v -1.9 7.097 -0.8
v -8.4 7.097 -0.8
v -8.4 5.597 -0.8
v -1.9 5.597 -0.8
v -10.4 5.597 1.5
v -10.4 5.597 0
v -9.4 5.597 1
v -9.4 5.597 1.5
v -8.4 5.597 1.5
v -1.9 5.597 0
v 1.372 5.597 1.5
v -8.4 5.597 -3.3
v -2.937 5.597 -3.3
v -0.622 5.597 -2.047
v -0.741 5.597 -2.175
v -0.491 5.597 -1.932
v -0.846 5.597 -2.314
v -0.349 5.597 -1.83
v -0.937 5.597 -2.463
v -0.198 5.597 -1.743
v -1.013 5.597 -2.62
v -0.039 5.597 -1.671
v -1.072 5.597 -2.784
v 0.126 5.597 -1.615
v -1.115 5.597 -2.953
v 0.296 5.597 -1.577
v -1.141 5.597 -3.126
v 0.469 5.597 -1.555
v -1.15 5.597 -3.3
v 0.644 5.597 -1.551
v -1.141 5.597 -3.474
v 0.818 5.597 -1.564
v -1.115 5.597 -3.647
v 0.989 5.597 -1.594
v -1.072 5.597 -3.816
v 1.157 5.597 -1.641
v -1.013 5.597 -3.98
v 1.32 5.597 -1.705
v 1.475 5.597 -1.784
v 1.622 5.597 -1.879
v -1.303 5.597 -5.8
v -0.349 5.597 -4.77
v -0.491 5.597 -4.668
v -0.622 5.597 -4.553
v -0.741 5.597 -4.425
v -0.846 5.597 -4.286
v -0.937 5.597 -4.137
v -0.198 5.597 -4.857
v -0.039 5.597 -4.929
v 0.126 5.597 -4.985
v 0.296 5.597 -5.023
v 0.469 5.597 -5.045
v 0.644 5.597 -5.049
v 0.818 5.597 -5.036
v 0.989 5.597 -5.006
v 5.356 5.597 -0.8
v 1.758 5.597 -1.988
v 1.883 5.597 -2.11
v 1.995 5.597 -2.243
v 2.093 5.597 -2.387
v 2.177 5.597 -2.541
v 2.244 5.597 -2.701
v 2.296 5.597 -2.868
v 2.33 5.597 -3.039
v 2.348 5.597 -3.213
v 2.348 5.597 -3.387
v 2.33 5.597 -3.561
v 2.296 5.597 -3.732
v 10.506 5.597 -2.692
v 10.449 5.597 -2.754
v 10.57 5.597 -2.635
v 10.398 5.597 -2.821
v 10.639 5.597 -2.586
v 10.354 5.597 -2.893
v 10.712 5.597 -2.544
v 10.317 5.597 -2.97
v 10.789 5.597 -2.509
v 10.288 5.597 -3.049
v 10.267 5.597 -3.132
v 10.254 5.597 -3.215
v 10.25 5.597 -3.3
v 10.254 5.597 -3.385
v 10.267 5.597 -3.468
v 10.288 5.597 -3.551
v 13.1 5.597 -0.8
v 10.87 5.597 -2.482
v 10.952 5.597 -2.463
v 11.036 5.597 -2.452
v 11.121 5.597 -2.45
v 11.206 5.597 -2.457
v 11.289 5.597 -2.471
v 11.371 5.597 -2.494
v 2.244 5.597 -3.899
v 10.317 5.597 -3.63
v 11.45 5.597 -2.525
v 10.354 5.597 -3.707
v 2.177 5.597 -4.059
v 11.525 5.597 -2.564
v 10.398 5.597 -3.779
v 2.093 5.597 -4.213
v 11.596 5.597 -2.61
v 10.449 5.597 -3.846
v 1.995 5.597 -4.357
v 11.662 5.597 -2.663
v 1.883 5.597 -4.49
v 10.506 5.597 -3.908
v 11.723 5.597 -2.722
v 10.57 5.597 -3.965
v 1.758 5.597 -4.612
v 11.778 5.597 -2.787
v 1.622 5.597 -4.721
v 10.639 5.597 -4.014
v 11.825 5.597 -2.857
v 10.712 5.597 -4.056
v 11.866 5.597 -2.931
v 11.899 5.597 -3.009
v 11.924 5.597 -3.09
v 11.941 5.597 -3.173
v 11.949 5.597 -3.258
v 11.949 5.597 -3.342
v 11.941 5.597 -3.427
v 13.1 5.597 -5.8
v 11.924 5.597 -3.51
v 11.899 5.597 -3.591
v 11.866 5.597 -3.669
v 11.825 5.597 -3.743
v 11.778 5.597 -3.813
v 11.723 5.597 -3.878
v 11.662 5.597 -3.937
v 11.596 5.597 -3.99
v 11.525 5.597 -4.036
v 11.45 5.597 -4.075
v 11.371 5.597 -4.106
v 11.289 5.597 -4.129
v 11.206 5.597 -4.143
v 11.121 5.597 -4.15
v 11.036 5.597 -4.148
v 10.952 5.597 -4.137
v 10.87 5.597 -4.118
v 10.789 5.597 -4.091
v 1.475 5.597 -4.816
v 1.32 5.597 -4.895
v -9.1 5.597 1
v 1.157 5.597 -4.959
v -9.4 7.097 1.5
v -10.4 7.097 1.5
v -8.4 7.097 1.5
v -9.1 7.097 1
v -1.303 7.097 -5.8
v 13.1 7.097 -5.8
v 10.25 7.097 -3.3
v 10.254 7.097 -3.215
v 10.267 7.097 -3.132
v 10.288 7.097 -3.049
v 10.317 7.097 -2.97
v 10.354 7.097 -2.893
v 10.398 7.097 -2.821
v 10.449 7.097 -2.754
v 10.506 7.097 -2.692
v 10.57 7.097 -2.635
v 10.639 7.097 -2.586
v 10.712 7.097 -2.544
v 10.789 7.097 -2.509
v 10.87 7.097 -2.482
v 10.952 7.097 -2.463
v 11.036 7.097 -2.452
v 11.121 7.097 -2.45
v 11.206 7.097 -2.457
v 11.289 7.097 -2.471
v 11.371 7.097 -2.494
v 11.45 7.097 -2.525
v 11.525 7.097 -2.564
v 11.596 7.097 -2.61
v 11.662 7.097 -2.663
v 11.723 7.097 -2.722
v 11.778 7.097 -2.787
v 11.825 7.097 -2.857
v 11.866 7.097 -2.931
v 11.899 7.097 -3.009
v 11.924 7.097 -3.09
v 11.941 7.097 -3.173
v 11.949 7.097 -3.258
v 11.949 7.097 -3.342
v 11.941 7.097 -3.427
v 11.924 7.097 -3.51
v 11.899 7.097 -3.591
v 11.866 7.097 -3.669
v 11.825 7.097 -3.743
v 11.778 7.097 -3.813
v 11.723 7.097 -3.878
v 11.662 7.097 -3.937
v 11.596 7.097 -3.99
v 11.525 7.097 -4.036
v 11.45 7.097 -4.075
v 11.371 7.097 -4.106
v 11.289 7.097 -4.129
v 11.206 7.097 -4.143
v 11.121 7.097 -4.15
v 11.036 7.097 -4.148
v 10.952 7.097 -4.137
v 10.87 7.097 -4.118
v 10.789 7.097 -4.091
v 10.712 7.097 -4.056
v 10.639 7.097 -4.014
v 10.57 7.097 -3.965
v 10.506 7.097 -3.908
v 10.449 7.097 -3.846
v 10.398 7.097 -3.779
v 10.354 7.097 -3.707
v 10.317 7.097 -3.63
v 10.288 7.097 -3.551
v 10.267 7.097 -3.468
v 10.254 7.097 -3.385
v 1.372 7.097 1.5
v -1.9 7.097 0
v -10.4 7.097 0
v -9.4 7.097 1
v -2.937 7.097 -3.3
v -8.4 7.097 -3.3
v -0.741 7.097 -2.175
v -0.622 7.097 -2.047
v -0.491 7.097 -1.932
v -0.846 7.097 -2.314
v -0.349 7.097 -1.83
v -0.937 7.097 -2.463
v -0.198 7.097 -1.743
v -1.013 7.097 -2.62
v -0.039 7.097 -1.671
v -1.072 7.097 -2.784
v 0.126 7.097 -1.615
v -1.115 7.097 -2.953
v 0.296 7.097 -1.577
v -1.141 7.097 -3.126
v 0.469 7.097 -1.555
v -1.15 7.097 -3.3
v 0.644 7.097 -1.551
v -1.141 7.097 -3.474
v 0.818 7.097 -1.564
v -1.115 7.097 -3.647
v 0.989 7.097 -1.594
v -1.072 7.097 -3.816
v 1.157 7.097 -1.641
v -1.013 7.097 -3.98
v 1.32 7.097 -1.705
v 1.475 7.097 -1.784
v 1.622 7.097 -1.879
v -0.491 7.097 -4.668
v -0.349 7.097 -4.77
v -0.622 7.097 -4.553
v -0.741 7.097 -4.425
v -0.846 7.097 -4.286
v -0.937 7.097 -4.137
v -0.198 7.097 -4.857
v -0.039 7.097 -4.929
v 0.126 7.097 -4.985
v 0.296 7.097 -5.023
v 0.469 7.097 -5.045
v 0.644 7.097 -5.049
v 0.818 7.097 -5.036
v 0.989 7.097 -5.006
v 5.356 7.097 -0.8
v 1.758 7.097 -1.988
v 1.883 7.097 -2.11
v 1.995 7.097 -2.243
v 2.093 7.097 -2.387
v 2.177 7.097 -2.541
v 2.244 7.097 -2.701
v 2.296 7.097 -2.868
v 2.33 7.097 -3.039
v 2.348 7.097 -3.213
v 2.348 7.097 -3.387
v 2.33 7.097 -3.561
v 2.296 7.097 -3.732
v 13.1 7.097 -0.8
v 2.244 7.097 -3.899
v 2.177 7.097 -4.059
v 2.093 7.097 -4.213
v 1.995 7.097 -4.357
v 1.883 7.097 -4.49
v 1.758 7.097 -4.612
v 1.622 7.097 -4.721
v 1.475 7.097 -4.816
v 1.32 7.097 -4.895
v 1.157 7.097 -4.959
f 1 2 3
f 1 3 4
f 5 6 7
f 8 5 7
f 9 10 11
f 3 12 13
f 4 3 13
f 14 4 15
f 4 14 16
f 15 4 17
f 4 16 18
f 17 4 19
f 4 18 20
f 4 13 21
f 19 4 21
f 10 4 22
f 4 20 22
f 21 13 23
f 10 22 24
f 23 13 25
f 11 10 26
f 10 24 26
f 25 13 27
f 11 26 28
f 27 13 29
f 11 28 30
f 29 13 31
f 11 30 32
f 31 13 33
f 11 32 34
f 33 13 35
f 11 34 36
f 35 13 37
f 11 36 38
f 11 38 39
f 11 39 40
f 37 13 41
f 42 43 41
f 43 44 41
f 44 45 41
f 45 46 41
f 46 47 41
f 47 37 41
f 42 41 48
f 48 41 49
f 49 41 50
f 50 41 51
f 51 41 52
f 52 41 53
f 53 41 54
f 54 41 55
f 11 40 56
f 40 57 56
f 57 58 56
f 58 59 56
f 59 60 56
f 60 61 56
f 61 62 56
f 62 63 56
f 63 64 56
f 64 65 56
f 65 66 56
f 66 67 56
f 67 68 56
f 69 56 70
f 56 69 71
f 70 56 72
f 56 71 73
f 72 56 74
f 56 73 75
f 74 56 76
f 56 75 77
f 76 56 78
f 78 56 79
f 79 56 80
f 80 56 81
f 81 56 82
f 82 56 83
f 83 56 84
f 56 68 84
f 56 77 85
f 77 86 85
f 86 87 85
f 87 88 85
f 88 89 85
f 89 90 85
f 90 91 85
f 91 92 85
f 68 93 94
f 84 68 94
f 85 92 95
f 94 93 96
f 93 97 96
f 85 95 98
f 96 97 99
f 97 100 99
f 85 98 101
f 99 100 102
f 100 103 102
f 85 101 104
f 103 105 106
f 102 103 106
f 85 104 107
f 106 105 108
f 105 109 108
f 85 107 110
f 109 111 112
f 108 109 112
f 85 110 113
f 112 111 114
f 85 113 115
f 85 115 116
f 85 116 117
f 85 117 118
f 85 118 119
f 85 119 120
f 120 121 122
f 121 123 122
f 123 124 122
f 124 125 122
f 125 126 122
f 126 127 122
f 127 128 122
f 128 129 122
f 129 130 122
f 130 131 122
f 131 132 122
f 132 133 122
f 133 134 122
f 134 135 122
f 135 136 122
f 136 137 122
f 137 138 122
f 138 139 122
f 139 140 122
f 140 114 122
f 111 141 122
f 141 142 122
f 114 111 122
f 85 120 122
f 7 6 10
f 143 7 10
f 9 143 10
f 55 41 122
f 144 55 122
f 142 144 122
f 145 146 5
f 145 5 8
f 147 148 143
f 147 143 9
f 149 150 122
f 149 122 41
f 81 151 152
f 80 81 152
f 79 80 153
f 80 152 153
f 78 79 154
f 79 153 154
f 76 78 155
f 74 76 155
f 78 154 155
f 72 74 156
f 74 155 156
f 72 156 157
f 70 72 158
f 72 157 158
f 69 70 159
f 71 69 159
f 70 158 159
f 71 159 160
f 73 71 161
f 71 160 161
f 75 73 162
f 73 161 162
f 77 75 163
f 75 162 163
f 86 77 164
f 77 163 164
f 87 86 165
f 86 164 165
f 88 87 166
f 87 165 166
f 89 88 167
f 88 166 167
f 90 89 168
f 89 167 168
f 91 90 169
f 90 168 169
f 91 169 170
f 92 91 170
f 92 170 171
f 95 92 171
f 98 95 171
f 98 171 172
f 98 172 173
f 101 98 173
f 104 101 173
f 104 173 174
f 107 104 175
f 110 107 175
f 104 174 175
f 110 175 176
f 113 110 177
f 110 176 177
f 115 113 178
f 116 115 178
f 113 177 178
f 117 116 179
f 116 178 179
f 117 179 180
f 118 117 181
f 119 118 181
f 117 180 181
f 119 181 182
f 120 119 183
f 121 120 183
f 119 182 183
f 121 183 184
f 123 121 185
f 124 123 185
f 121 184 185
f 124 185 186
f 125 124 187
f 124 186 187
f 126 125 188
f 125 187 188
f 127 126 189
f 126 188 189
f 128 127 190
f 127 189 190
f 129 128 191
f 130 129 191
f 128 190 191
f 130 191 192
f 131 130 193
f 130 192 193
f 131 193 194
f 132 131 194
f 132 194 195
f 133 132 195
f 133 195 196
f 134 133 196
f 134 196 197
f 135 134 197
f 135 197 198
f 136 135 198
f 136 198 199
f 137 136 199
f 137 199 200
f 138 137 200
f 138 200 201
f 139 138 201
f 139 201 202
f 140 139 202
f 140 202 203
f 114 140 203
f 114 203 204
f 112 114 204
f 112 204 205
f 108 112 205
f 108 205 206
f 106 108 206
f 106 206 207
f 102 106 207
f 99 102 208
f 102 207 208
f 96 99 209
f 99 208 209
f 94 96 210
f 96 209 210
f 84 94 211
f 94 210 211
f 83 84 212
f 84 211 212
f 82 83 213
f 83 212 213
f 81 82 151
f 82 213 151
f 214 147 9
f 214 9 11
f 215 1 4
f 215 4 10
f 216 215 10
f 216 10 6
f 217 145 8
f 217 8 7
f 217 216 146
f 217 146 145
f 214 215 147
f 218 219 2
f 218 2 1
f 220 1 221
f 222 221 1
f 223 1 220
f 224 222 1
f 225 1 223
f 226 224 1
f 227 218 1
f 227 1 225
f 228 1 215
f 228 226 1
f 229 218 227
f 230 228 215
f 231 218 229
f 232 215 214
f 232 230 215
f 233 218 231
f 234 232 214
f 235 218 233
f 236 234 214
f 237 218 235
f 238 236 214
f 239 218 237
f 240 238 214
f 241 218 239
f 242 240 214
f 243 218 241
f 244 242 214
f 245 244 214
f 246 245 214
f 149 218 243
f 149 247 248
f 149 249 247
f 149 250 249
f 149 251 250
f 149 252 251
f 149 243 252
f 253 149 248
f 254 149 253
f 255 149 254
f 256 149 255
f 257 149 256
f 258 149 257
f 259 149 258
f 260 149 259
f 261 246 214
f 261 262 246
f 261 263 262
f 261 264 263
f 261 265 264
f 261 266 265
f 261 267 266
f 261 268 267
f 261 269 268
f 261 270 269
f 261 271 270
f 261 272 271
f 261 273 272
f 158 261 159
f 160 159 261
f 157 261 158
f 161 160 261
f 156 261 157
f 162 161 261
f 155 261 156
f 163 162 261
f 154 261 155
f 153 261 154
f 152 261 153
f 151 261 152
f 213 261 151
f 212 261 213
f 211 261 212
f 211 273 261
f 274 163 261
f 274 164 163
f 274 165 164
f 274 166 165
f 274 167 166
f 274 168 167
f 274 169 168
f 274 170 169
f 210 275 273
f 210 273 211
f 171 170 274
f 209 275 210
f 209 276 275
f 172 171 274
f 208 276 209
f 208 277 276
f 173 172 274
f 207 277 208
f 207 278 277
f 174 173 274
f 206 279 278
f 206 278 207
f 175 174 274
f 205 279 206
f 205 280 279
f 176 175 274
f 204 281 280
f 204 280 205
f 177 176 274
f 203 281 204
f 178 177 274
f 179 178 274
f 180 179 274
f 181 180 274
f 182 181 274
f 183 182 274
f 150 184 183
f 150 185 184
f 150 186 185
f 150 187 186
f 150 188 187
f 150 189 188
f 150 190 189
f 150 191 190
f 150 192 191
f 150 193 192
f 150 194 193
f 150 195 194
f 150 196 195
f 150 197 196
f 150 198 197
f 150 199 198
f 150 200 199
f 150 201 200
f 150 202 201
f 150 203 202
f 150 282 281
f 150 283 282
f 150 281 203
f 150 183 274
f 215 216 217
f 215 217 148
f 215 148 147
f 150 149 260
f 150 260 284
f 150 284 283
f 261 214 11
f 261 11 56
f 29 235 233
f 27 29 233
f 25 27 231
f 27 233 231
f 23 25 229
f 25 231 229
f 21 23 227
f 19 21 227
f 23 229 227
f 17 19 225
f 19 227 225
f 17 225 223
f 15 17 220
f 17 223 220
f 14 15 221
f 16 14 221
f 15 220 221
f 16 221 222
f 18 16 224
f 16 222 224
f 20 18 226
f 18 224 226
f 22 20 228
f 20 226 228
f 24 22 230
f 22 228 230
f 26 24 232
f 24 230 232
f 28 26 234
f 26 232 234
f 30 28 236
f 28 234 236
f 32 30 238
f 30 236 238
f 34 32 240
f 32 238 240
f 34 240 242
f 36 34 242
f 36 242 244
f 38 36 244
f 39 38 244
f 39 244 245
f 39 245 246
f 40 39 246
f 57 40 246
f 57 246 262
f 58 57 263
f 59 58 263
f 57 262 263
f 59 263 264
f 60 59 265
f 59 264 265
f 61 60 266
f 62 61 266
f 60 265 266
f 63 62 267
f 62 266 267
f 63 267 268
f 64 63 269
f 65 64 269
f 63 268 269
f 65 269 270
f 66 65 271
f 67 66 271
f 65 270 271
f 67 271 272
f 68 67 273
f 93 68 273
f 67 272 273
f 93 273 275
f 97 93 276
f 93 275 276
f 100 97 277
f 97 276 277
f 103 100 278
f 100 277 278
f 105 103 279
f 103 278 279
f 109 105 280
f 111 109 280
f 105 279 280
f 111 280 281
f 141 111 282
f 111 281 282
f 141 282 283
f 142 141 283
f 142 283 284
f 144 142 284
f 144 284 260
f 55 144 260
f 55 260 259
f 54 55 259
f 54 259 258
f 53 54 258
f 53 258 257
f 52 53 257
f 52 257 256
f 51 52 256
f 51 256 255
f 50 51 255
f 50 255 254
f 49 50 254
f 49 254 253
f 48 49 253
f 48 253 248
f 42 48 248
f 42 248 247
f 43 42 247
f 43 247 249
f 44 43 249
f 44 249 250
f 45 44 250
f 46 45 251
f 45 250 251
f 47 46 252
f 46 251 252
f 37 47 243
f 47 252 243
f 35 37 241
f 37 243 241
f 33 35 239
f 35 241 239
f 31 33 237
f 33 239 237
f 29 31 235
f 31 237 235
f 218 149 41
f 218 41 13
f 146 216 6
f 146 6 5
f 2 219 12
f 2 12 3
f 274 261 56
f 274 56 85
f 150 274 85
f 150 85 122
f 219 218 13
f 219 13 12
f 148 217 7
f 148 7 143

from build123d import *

# Parameters (mm, degrees)
SKETCH_2_R      = 0.85
SKETCH_2_R_2    = 1.75
EXTRUDE_1_DEPTH = 1.5


with BuildPart() as part:
    # 草图2 → 凸台-拉伸1 (new body)
    with BuildSketch(Plane(origin=(0, 7.096792112, 0), x_dir=(1, 0, 0), z_dir=(0, 1, 0))):
        Polygon((-1.9, 0), (-10.4, 0), (-10.4, -1.5), (-9.4, -1.5), (-9.4, -1), (-9.1, -1), (-8.4, -1.5), (1.371788561, -1.5), (5.355505418, 0.8), (13.1, 0.8), (13.1, 5.8), (-1.303412873, 5.8), (-2.936751866, 3.3), (-8.4, 3.3), (-8.4, 0.8), (-1.9, 0.8), align=None)
        with Locations(Location((11.1, 3.3, 0), (0, 0, 180))):
            Circle(SKETCH_2_R, mode=Mode.SUBTRACT)
        with Locations(Location((0.6, 3.3, 0), (0, 0, 180))):
            Circle(SKETCH_2_R_2, mode=Mode.SUBTRACT)
    extrude(amount=-EXTRUDE_1_DEPTH)


solid = part.part
